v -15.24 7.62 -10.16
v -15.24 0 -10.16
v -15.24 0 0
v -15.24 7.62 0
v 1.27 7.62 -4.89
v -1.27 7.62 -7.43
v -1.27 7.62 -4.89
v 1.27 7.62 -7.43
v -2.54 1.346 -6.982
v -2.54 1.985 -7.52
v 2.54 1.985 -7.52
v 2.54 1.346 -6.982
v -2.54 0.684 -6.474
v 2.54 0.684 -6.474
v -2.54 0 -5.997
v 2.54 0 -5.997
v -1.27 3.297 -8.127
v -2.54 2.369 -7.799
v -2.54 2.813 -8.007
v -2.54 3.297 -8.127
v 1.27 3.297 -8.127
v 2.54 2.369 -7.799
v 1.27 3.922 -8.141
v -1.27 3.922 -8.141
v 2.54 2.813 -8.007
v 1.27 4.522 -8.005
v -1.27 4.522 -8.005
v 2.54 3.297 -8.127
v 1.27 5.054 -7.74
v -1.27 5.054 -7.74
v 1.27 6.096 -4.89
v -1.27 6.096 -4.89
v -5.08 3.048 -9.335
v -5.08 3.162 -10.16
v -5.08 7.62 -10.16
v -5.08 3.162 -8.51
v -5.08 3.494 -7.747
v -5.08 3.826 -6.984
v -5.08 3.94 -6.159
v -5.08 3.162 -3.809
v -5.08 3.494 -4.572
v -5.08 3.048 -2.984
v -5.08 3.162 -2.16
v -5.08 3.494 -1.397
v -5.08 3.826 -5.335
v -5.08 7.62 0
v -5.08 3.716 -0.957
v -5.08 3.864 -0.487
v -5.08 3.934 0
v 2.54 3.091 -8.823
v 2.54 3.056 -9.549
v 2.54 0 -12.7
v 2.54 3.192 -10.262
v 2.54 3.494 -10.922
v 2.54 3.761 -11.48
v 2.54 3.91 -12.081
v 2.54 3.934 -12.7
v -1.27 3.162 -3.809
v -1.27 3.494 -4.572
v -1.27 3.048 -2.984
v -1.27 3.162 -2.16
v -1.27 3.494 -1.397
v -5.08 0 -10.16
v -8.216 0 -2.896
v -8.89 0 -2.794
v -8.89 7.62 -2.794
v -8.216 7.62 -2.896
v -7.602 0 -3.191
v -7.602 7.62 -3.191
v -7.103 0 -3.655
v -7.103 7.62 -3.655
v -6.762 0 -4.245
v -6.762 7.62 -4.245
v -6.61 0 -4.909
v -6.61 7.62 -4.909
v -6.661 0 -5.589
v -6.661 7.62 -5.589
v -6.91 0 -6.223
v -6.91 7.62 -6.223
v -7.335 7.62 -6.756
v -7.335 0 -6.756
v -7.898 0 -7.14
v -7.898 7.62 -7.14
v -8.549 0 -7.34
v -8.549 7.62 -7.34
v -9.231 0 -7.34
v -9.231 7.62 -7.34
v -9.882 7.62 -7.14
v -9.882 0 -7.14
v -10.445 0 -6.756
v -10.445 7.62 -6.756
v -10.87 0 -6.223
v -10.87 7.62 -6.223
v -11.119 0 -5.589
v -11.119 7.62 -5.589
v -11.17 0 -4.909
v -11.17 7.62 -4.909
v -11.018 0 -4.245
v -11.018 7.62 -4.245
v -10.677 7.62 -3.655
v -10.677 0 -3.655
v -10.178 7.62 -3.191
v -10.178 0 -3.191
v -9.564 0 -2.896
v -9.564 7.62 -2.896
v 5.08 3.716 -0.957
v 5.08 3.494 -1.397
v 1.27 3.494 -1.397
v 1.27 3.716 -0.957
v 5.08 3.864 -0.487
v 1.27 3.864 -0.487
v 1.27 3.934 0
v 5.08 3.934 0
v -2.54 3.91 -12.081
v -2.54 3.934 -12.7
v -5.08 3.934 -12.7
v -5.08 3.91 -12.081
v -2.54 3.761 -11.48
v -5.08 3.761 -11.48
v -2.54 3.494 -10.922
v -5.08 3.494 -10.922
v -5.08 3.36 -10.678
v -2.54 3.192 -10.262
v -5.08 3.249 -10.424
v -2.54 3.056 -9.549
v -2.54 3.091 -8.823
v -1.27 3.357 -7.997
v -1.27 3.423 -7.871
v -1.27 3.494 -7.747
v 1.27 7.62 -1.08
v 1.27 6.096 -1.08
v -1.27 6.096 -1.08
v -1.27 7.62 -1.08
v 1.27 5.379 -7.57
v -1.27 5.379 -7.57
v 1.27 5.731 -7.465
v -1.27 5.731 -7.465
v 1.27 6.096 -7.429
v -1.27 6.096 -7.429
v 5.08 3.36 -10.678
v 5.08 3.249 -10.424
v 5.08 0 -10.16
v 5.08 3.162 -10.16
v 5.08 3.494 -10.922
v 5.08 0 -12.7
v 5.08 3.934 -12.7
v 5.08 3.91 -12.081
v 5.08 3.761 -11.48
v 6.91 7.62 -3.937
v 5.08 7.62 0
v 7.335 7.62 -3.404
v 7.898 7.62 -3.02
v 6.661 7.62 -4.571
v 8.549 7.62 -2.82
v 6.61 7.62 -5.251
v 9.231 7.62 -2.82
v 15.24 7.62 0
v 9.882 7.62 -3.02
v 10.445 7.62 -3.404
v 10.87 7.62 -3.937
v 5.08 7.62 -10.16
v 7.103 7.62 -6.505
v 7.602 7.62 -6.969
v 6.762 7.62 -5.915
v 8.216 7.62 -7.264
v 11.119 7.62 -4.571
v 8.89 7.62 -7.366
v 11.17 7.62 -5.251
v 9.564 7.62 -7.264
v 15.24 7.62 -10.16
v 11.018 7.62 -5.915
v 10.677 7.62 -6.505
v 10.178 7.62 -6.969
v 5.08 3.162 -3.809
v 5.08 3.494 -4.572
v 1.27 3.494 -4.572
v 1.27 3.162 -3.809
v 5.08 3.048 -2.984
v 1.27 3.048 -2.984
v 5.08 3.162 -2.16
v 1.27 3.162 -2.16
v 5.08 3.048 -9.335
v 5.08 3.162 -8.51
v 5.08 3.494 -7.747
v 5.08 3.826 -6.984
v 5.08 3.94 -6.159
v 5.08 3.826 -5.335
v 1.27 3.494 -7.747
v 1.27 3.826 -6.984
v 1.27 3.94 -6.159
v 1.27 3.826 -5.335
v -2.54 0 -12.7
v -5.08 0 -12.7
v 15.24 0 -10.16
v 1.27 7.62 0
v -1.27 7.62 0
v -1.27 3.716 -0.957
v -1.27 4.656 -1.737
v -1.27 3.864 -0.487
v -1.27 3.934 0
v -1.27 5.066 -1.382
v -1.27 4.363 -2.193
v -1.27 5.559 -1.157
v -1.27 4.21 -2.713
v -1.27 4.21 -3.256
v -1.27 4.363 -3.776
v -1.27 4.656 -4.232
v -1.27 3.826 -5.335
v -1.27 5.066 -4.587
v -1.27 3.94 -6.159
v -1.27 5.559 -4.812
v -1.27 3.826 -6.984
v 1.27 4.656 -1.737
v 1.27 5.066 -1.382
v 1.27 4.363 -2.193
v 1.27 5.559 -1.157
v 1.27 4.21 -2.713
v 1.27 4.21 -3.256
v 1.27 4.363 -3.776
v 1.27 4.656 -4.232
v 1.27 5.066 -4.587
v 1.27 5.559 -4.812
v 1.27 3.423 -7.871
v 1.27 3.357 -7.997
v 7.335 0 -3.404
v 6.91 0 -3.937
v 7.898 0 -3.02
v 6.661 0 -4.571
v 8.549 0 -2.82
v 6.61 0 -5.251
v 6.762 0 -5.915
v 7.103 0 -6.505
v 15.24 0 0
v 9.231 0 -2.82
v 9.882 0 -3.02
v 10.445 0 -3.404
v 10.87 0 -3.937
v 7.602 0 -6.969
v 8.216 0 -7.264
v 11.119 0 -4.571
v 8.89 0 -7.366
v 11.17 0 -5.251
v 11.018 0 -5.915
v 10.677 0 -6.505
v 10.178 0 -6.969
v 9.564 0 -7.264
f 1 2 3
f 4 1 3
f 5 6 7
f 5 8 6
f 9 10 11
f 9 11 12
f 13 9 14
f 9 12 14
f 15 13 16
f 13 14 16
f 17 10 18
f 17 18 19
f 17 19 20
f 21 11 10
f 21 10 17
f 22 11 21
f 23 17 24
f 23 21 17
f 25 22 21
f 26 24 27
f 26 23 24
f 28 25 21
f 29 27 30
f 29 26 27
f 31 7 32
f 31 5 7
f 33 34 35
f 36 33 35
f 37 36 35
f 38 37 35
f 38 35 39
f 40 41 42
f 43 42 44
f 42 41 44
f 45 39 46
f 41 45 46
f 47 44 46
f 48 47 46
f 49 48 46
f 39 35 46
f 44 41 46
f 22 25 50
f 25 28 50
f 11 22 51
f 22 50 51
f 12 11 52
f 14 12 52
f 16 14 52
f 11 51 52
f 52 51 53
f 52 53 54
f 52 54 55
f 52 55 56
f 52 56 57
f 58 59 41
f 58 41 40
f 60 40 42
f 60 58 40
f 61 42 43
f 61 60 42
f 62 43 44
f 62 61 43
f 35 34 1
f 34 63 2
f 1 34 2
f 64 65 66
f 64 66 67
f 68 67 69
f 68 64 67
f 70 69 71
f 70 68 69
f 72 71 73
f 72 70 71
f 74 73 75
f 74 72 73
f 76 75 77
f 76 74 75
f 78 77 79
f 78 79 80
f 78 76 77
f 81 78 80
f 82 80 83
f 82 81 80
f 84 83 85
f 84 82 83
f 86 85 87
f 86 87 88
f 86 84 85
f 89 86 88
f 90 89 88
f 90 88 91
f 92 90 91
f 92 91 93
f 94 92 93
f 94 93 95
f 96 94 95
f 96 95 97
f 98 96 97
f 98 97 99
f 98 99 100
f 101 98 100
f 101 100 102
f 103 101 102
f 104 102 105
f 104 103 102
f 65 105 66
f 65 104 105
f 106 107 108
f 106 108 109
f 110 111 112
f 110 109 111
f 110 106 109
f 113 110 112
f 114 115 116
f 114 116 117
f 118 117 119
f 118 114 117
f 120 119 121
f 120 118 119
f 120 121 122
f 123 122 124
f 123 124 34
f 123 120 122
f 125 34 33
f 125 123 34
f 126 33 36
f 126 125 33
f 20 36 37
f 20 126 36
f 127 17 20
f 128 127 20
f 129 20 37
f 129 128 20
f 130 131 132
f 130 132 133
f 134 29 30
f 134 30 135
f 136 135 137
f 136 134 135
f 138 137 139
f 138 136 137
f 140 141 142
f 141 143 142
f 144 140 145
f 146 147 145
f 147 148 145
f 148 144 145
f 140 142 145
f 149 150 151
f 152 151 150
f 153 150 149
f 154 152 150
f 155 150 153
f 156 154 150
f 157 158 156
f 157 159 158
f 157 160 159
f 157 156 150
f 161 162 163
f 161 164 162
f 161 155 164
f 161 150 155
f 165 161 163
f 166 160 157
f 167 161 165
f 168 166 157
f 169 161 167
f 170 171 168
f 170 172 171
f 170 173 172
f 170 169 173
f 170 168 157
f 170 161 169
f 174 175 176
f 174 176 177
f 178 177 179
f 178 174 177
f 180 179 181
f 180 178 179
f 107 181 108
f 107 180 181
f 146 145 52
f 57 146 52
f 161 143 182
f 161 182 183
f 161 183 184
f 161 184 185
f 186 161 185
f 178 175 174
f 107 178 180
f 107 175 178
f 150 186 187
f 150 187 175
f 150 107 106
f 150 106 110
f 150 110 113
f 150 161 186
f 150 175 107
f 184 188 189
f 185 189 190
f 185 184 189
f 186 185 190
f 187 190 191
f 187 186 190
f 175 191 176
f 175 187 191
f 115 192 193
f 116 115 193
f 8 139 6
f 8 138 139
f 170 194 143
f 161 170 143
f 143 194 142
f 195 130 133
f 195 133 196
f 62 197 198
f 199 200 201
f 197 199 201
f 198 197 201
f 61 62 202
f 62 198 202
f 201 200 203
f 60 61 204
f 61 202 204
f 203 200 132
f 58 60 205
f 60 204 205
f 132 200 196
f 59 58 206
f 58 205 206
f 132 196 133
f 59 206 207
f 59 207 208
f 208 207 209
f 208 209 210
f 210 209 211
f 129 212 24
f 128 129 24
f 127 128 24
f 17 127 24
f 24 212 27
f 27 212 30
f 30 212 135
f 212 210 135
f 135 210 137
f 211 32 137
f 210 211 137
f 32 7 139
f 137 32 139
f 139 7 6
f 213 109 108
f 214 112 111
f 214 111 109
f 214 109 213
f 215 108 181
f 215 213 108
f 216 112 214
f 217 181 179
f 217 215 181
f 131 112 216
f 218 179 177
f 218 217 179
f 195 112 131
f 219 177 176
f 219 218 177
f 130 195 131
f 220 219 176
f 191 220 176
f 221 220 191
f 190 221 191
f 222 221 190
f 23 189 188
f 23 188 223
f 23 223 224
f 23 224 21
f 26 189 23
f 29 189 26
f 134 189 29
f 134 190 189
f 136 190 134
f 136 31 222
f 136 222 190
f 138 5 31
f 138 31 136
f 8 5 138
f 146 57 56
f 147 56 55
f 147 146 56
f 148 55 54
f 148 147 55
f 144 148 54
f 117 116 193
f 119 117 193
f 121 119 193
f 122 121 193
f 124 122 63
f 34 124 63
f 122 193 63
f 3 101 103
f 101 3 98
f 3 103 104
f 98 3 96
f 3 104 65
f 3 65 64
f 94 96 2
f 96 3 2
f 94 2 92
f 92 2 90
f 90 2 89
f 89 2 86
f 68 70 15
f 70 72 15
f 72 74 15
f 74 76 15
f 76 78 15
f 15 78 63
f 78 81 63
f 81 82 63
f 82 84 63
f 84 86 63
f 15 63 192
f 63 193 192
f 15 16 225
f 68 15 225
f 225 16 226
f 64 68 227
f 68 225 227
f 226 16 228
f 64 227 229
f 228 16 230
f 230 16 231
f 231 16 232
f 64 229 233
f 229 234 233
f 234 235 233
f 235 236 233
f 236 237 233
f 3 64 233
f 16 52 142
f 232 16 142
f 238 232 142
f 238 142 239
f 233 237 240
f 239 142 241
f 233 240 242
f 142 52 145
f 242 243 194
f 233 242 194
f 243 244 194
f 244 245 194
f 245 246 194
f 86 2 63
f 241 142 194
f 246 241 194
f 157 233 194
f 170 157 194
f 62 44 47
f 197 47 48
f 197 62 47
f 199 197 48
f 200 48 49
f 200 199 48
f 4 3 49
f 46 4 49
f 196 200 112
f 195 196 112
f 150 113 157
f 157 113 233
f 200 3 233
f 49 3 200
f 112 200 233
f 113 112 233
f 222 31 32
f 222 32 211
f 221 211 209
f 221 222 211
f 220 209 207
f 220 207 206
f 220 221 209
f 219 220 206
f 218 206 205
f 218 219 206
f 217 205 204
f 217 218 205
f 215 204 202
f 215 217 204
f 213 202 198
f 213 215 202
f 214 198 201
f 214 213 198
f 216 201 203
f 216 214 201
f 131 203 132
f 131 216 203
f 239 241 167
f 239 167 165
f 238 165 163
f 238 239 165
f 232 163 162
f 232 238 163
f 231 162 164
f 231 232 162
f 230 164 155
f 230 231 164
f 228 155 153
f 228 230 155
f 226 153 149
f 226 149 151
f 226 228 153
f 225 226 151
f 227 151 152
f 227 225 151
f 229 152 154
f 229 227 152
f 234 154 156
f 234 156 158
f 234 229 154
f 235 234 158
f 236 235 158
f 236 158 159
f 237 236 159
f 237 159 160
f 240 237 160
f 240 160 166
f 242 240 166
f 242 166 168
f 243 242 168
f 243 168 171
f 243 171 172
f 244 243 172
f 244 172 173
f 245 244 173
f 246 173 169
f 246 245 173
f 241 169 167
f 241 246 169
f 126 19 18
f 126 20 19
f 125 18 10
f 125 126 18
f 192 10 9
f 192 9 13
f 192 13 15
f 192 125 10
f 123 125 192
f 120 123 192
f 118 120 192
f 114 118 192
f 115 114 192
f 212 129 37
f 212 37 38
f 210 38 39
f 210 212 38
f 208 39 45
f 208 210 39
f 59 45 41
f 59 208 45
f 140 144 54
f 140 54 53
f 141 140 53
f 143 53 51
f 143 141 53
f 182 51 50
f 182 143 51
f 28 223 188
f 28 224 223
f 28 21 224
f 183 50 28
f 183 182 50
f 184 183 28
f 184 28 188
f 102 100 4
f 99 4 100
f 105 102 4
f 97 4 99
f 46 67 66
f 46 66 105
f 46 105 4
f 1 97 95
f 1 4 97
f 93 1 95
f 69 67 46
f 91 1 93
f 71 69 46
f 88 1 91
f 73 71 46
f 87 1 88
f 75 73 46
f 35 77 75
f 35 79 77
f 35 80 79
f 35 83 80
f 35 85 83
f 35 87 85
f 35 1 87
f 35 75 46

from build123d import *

# Parameters (mm, degrees)
SKETCH1_R           = 2.286
BOSS_EXTRUDE1_DEPTH = 7.62
CUT_EXTRUDE1_DEPTH  = 10.16
BOSS_EXTRUDE2_DEPTH = 1.27
SKETCH4_R           = 18.415
CUT_EXTRUDE2_DEPTH  = 2.54
FILLET1_R           = 2.54


with BuildPart() as part:
    # Sketch1 → Boss-Extrude1 (new body)
    with BuildSketch(Plane(origin=(0, 0, 0), x_dir=(1, 0, 0), z_dir=(0, 1, 0))):
        Polygon((5.08, 12.7), (-5.08, 12.7), (-5.08, 10.16), (-15.24, 10.16), (-15.24, 0), (15.24, 0), (15.24, 10.16), (5.08, 10.16), align=None)
        with Locations(Location((-8.89, 5.08, 0), (0, 0, 270))):
            Circle(SKETCH1_R, mode=Mode.SUBTRACT)
        with Locations(Location((8.89, 5.08, 0), (0, 0, 90))):
            Circle(SKETCH1_R, mode=Mode.SUBTRACT)
    extrude(amount=BOSS_EXTRUDE1_DEPTH)

    # Sketch2 → Cut-Extrude1 (cut)
    with BuildSketch(Plane(origin=(5.08, 0, 0), x_dir=(0, 0, -1), z_dir=(1, 0, 0))):
        with BuildLine():
            Line((2.9845, 9.144), (15.6845, 9.144))
            ThreePointArc((15.6845, 9.144), (18.618869601, 5.27151286), (14.097, 3.494049241))
            ThreePointArc((14.097, 3.494049241), (12.5095, 3.940098483), (10.922, 3.494049241))
            ThreePointArc((10.922, 3.494049241), (9.3345, 3.048), (7.747, 3.494049241))
            ThreePointArc((7.747, 3.494049241), (6.1595, 3.940098483), (4.572, 3.494049241))
            ThreePointArc((4.572, 3.494049241), (2.9845, 3.048), (1.397, 3.494049241))
            ThreePointArc((1.397, 3.494049241), (-0.1905, 3.940098483), (-1.778, 3.494049241))
            ThreePointArc((-1.778, 3.494049241), (-2.54101286, 3.161630399), (-3.3655, 3.048))
            Line((-3.3655, 3.048), (-3.3655, 9.144))
            Line((-3.3655, 9.144), (2.9845, 9.144))
        make_face()
    extrude(amount=-CUT_EXTRUDE1_DEPTH, mode=Mode.SUBTRACT)

    # Sketch3 → Boss-Extrude2 (add, symmetric)
    with BuildSketch(Plane(origin=(0, 0, 0), x_dir=(0, 0, -1), z_dir=(1, 0, 0))):
        with BuildLine():
            Line((4.8895, 7.62), (4.8895, 6.096))
            ThreePointArc((4.8895, 6.096), (2.9845, 4.191), (1.0795, 6.096))
            Line((1.0795, 6.096), (1.0795, 7.62))
            Line((1.0795, 7.62), (0, 7.62))
            Line((0, 7.62), (0, 3.934139533))
            ThreePointArc((0, 3.934139533), (0.725327968, 3.799255708), (1.397, 3.494049241))
            ThreePointArc((1.397, 3.494049241), (2.9845, 3.048), (4.572, 3.494049241))
            ThreePointArc((4.572, 3.494049241), (6.1595, 3.940098483), (7.747, 3.494049241))
            ThreePointArc((7.747, 3.494049241), (9.3345, 3.048), (10.922, 3.494049241))
            ThreePointArc((10.922, 3.494049241), (11.777159836, 3.850811359), (12.7, 3.934139533))
            Line((12.7, 3.934139533), (12.7, 7.62))
            Line((12.7, 7.62), (11.2395, 7.62))
            Line((11.2395, 7.62), (11.2395, 6.096))
            ThreePointArc((11.2395, 6.096), (9.3345, 4.191), (7.4295, 6.096))
            Line((7.4295, 6.096), (7.4295, 7.62))
            Line((7.4295, 7.62), (4.8895, 7.62))
        make_face()
    extrude(amount=BOSS_EXTRUDE2_DEPTH, both=True)

    # Sketch4 → Cut-Extrude2 (cut, symmetric)
    with BuildSketch(Plane(origin=(0, 0, 0), x_dir=(0, 0, -1), z_dir=(1, 0, 0))):
        with Locations((21.336, -10.18977017)):
            Circle(SKETCH4_R)
    extrude(amount=CUT_EXTRUDE2_DEPTH, both=True, mode=Mode.SUBTRACT)


with BuildPart() as cut_extrude2_kept_piece:
    # of the separate pieces the step leaves, the one the design keeps (cut_extrude2_pieces_kept)
    add(part.part.solids().sort_by_distance((5.08, 0, -12.7))[0])

    # Fillet1
    fillet1_edges = [cut_extrude2_kept_piece.edges().sort_by_distance(p)[0] for p in [
        (0, 4.301003177, -9.972474456),
    ]]
    fillet(fillet1_edges, radius=FILLET1_R)


solid = cut_extrude2_kept_piece.part
